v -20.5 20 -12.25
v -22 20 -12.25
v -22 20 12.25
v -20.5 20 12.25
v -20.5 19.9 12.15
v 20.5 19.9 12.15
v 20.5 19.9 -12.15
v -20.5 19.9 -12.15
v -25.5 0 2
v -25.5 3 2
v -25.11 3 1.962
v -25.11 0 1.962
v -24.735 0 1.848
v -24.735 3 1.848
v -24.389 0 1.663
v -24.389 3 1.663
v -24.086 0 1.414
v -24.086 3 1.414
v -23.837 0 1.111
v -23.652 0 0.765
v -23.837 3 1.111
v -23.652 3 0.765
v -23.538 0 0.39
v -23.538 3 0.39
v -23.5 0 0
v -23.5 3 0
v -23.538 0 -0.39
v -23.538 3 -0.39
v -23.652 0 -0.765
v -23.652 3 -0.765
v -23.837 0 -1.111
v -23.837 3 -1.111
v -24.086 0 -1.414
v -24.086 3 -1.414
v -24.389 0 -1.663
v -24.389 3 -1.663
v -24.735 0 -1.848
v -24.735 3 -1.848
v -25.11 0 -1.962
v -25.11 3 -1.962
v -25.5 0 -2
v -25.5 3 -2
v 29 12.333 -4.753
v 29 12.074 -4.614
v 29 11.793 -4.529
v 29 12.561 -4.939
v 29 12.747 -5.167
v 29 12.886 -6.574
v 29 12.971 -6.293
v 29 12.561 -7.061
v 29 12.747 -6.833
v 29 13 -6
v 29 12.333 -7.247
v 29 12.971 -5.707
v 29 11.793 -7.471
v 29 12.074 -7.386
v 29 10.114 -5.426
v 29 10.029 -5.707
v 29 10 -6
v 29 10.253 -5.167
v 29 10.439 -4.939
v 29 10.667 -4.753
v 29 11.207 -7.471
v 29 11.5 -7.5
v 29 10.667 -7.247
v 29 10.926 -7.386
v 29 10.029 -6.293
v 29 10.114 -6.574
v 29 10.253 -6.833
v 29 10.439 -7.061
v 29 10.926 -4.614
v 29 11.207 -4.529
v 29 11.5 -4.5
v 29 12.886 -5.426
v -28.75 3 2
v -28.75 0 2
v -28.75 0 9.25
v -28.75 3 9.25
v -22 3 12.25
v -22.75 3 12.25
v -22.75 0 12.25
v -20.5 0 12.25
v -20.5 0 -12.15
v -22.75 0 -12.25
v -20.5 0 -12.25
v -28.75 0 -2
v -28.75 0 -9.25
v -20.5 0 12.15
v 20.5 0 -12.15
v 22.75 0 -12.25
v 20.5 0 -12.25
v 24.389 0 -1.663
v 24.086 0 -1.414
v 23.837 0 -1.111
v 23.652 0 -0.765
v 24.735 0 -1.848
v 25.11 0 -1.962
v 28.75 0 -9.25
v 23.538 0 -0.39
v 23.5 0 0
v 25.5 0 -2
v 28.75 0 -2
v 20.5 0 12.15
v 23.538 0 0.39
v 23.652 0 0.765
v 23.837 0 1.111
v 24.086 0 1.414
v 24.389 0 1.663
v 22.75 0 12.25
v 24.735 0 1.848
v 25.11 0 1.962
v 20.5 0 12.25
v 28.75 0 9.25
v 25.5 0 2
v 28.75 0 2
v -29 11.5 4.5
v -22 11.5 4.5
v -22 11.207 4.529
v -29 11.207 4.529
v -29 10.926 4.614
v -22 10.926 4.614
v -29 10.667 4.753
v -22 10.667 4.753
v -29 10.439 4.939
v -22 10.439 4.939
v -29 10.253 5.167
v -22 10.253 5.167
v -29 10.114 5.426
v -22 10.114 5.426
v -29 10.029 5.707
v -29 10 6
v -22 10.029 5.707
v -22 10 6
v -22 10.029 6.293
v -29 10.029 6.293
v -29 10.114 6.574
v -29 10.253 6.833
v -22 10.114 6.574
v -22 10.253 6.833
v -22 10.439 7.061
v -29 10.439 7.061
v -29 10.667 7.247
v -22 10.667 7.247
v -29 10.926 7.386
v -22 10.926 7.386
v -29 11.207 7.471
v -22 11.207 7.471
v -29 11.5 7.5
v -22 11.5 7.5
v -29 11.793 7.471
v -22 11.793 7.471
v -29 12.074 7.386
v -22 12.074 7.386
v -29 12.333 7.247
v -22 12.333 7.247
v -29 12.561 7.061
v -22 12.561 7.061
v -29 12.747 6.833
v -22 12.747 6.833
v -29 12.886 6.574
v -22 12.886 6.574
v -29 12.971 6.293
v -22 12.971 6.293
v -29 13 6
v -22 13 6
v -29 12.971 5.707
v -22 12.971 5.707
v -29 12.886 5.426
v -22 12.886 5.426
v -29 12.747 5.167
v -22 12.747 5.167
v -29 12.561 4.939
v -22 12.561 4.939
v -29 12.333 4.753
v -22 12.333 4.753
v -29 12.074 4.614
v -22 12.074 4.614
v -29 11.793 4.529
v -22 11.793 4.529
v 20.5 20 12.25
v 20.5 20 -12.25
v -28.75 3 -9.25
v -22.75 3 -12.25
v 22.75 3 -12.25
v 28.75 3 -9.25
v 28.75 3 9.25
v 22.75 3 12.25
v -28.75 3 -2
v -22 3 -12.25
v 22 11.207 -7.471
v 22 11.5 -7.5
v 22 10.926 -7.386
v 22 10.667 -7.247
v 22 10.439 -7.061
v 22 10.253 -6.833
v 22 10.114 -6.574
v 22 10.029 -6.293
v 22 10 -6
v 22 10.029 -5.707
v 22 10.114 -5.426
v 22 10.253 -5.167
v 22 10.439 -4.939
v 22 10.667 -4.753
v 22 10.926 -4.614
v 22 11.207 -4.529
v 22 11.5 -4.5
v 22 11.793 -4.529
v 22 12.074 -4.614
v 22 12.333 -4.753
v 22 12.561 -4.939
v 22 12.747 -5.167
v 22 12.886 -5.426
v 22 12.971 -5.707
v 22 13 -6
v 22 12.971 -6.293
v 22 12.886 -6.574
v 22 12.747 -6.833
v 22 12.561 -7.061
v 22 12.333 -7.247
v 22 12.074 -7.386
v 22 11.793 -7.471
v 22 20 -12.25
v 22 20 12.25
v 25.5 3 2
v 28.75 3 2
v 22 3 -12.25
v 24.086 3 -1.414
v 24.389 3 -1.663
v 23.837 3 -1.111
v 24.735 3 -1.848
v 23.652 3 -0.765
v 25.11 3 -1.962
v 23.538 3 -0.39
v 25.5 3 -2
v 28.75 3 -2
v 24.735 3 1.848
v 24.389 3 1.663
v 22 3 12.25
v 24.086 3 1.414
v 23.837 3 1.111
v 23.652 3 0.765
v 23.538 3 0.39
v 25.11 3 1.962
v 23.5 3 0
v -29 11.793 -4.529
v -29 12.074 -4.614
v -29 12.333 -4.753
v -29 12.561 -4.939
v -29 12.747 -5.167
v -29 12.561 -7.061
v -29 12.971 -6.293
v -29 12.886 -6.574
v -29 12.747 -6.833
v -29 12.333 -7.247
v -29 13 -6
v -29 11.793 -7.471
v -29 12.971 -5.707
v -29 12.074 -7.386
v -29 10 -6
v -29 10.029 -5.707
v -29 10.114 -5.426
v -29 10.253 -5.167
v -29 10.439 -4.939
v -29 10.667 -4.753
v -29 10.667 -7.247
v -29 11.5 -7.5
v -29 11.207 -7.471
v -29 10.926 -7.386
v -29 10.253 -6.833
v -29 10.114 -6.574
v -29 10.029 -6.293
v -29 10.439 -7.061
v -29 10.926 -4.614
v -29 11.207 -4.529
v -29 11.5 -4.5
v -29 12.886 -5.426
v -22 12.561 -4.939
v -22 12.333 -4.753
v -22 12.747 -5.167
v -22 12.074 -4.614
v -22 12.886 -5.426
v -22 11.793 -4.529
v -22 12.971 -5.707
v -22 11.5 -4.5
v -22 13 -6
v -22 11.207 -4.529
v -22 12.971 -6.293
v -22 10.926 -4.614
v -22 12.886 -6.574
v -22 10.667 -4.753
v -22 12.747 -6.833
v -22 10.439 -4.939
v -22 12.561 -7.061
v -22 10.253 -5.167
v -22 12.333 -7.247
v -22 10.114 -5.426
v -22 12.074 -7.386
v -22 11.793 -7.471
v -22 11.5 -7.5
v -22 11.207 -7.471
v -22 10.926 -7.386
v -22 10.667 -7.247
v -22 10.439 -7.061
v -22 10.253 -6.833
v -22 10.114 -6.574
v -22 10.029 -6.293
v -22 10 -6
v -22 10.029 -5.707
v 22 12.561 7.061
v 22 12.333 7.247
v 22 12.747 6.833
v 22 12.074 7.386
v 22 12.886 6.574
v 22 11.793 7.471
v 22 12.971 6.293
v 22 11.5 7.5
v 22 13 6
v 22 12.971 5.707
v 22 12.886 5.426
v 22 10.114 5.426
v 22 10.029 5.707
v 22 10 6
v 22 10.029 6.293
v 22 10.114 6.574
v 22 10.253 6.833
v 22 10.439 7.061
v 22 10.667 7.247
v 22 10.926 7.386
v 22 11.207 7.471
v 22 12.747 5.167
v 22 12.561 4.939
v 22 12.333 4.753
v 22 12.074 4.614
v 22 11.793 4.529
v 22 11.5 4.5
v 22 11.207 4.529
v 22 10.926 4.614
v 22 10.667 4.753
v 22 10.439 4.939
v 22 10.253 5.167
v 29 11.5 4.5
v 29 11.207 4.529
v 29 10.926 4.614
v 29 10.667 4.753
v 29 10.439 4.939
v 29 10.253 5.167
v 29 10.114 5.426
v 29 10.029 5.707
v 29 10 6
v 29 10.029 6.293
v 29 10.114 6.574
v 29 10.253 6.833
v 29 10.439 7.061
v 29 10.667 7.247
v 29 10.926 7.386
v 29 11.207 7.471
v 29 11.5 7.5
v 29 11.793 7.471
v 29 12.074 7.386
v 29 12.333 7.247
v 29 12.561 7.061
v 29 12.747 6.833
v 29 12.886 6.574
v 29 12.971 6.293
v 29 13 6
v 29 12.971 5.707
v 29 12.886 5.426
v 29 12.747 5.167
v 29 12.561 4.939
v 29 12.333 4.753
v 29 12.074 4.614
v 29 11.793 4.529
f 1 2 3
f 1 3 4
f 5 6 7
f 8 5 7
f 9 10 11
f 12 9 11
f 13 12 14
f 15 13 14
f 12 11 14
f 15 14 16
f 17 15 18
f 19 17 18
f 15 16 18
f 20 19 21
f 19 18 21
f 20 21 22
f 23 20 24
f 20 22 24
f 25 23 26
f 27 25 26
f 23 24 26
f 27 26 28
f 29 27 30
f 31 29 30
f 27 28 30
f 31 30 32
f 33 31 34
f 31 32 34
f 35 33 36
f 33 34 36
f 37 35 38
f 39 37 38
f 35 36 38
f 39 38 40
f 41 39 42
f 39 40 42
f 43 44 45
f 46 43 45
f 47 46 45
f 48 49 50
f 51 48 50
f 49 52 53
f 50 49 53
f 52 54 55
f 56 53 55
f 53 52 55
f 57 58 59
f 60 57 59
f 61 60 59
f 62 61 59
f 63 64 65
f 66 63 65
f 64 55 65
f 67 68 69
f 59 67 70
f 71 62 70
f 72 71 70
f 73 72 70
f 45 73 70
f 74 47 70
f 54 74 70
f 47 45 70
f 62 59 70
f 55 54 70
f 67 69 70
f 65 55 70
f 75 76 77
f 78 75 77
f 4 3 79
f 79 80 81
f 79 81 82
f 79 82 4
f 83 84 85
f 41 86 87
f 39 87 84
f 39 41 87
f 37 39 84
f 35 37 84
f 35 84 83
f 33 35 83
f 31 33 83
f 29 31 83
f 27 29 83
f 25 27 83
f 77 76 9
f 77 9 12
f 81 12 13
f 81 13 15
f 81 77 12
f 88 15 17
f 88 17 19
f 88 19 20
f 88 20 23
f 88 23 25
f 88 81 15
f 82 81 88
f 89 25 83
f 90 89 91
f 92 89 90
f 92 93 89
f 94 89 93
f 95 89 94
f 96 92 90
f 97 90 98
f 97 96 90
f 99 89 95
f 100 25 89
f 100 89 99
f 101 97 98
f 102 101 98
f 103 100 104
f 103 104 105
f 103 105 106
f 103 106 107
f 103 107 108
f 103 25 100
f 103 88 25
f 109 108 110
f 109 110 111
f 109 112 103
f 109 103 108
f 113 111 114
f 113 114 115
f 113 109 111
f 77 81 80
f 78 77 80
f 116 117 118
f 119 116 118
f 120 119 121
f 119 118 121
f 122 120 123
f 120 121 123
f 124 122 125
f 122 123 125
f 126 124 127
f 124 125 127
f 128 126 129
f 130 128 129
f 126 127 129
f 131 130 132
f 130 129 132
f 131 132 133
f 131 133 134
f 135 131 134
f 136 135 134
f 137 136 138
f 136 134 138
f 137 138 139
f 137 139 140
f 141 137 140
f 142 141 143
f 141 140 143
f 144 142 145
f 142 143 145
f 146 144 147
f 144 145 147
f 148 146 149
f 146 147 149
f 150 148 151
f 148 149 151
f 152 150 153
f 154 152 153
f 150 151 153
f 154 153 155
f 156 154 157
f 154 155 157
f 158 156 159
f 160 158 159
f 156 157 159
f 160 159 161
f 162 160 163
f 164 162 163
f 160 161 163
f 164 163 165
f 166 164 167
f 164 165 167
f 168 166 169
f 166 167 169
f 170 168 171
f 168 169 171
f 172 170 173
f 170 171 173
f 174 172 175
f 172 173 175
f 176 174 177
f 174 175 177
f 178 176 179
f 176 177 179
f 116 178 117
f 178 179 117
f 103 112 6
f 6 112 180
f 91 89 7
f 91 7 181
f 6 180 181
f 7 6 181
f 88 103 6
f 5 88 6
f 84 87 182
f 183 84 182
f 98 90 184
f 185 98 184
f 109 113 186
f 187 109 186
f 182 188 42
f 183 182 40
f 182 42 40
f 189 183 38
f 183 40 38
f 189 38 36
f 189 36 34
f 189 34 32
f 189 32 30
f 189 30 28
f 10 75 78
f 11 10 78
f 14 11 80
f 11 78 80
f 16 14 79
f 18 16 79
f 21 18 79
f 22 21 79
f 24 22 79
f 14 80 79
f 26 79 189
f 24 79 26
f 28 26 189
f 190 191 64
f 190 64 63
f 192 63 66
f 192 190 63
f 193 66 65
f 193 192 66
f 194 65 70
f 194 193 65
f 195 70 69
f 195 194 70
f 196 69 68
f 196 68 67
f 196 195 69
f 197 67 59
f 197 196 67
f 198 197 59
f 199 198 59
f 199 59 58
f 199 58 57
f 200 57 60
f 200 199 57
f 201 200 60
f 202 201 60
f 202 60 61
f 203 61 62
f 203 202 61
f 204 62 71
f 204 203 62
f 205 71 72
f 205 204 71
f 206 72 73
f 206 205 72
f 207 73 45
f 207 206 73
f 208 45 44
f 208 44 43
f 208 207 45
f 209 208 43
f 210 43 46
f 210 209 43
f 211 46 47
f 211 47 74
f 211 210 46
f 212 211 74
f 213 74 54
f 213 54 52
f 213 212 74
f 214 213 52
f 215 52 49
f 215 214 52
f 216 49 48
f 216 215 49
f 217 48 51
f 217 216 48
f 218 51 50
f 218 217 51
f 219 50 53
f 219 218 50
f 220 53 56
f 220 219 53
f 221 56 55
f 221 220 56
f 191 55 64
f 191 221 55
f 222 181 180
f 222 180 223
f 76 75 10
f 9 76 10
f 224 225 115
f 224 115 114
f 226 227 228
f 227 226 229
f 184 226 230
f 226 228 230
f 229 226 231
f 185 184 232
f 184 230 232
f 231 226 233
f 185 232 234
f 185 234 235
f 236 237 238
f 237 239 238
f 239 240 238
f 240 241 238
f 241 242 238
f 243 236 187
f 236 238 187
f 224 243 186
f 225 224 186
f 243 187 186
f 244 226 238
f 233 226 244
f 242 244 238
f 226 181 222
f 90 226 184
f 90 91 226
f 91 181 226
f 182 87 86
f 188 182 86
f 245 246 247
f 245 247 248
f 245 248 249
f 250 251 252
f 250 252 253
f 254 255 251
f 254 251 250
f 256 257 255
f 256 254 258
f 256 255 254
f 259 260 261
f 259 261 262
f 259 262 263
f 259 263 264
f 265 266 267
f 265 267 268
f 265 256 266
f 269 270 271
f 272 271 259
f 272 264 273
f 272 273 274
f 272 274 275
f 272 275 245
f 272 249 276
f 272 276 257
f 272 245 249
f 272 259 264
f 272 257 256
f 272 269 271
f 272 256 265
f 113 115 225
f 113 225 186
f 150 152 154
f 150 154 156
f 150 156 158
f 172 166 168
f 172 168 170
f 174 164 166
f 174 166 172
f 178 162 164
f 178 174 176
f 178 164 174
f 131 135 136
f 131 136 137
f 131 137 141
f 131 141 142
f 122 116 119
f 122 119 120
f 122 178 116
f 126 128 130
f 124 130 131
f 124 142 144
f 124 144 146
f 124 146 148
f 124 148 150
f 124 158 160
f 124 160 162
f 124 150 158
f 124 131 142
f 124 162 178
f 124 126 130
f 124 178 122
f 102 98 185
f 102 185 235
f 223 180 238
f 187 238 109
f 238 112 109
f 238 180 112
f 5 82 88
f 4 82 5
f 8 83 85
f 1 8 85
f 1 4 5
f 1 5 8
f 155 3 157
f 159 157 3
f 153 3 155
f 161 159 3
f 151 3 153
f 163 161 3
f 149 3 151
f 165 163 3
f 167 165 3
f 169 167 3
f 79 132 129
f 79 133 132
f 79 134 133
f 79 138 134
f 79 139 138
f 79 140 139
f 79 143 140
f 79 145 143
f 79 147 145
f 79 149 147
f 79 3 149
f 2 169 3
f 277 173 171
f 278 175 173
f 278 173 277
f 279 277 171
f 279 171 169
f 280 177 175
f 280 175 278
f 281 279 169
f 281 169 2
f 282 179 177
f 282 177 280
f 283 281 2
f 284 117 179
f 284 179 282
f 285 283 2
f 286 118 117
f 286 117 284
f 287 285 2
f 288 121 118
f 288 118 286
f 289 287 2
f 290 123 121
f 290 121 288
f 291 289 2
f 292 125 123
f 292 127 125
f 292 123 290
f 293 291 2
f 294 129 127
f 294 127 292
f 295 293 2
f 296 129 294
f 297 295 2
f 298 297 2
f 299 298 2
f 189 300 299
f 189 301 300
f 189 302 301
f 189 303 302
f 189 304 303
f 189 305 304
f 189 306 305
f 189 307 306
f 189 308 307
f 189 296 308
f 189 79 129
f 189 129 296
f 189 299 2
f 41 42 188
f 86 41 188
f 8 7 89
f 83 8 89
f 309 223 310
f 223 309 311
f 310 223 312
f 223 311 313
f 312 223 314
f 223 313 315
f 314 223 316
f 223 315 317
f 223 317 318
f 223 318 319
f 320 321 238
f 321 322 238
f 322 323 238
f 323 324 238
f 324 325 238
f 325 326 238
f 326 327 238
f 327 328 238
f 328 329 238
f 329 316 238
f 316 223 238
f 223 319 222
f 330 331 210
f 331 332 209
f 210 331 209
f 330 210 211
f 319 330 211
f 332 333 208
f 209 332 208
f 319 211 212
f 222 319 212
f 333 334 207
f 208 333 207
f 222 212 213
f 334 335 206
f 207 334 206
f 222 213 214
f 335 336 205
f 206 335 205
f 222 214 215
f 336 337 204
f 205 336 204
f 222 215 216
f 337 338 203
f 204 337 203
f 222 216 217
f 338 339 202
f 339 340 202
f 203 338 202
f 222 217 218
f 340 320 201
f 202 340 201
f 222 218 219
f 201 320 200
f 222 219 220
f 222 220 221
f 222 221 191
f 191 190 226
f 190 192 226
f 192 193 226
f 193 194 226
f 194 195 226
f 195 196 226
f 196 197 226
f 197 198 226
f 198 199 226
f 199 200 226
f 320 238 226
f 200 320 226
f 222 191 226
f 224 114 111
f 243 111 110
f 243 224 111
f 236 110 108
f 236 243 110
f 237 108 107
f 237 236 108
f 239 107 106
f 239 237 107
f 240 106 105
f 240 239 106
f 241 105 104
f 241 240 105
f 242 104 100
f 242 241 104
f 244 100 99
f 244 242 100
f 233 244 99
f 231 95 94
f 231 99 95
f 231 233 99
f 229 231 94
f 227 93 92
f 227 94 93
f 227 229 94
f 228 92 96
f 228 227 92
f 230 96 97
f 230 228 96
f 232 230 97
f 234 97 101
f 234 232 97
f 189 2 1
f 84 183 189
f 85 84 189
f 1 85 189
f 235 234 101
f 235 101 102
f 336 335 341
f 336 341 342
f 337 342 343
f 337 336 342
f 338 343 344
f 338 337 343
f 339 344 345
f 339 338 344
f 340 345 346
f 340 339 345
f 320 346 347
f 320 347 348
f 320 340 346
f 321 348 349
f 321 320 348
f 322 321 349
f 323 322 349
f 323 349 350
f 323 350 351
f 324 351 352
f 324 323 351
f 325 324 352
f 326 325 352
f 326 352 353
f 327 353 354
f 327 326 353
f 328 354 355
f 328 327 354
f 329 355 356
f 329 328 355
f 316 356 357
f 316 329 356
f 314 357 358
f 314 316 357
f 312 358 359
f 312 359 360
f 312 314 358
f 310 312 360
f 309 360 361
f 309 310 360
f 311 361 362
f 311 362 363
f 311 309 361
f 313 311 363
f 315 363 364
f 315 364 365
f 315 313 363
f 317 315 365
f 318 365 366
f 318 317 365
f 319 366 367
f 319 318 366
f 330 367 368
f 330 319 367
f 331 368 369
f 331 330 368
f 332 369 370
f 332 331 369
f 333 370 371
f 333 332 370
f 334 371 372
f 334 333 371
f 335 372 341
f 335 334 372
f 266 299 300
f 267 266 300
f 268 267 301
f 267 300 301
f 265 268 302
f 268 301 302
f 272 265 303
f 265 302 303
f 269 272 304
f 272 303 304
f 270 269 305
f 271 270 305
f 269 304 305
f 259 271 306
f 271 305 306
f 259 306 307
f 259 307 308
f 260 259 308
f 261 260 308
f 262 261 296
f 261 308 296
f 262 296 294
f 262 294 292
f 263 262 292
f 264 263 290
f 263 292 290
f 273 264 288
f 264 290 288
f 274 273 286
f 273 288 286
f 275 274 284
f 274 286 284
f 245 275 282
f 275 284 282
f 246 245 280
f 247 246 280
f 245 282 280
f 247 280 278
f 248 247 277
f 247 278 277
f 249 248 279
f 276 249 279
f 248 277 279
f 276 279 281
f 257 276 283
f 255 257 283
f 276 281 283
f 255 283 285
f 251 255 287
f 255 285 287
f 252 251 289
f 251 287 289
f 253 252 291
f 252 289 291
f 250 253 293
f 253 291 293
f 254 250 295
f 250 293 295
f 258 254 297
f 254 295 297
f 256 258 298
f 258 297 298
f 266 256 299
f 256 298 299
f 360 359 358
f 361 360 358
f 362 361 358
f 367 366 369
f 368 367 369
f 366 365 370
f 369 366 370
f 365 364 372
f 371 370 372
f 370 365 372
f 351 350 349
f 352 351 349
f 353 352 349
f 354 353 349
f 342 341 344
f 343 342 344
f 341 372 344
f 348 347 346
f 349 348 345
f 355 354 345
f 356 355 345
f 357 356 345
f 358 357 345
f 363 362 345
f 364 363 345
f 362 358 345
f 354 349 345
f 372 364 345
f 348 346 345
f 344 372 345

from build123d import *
from OCP.BRepFilletAPI import BRepFilletAPI_MakeChamfer

# Parameters (mm, degrees)
SKETCH_1_W          = 44
SKETCH_1_H          = 24.5
EXTRUDE_1_DEPTH     = 20
SKETCH_2_W          = 57.5
SKETCH_2_H          = 24.5
EXTRUDE_2_DEPTH     = 3
CHAMFER_1_SIZE      = 3
CHAMFER_1_SIZE2     = 6
CHAMFER_2_SIZE      = 6
CHAMFER_2_SIZE2     = 3
CUT_EXTRUDE_1_DEPTH = 36.575623677
SKETCH_4_R          = 1.5
EXTRUDE_3_DEPTH     = 7
CUT_EXTRUDE_2_DEPTH = 20.5


with BuildPart() as part:
    # 草图1 → 凸台-拉伸1 (new body)
    with BuildSketch(Plane(origin=(0, 0, 0), x_dir=(1, 0, 0), z_dir=(0, 1, 0))):
        Rectangle(SKETCH_1_W, SKETCH_1_H)
    extrude(amount=EXTRUDE_1_DEPTH)

    # 草图2 → 凸台-拉伸2 (add)
    with BuildSketch(Plane.XZ):
        Rectangle(SKETCH_2_W, SKETCH_2_H)
    extrude(amount=-EXTRUDE_2_DEPTH)

    # 倒角1: one chamfer whose edges measure the first distance from different faces: ONE call of the kernel's chamfer builder (chamfer() names one face for all edges)
    chamfer_1_edges_1 = [part.edges().sort_by_distance(p)[0] for p in [
        (-28.75, 1.5, 12.25),
    ]]
    chamfer_1_side_1 = [part.faces().sort_by_distance(p)[0] for p in [
        (-28.75, 1.5, 0),
    ]]
    chamfer_1_edges_2 = [part.edges().sort_by_distance(p)[0] for p in [
        (28.75, 1.5, -12.25),
    ]]
    chamfer_1_side_2 = [part.faces().sort_by_distance(p)[0] for p in [
        (28.75, 1.5, 0),
    ]]
    chamfer_1 = BRepFilletAPI_MakeChamfer(part.part.solid().wrapped)
    for e in chamfer_1_edges_1:
        chamfer_1.Add(CHAMFER_1_SIZE, CHAMFER_1_SIZE2, e.wrapped, chamfer_1_side_1[0].wrapped)  # the first distance lies on this face
    for e in chamfer_1_edges_2:
        chamfer_1.Add(CHAMFER_1_SIZE, CHAMFER_1_SIZE2, e.wrapped, chamfer_1_side_2[0].wrapped)  # the first distance lies on this face
    add(Compound.cast(chamfer_1.Shape()), mode=Mode.REPLACE)

    # 倒角2: one chamfer whose edges measure the first distance from different faces: ONE call of the kernel's chamfer builder (chamfer() names one face for all edges)
    chamfer_2_edges_1 = [part.edges().sort_by_distance(p)[0] for p in [
        (-28.75, 1.5, -12.25),
    ]]
    chamfer_2_side_1 = [part.faces().sort_by_distance(p)[0] for p in [
        (-0.513573407, 9.788088643, -12.25),
    ]]
    chamfer_2_edges_2 = [part.edges().sort_by_distance(p)[0] for p in [
        (28.75, 1.5, 12.25),
    ]]
    chamfer_2_side_2 = [part.faces().sort_by_distance(p)[0] for p in [
        (0.513573407, 9.788088643, 12.25),
    ]]
    chamfer_2 = BRepFilletAPI_MakeChamfer(part.part.solid().wrapped)
    for e in chamfer_2_edges_1:
        chamfer_2.Add(CHAMFER_2_SIZE, CHAMFER_2_SIZE2, e.wrapped, chamfer_2_side_1[0].wrapped)  # the first distance lies on this face
    for e in chamfer_2_edges_2:
        chamfer_2.Add(CHAMFER_2_SIZE, CHAMFER_2_SIZE2, e.wrapped, chamfer_2_side_2[0].wrapped)  # the first distance lies on this face
    add(Compound.cast(chamfer_2.Shape()), mode=Mode.REPLACE)

    # 草图3 → 切除-拉伸1 (cut, through all)
    with BuildSketch(Plane(origin=(0, 3, 0), x_dir=(1, 0, 0), z_dir=(0, 1, 0))):
        with BuildLine():
            Line((-25.5, 2), (-28.75, 2))
            Line((-28.75, 2), (-28.75, -2))
            Line((-28.75, -2), (-25.5, -2))
            ThreePointArc((-25.5, -2), (-23.5, 0), (-25.5, 2))
        make_face()
        with BuildLine():
            Line((28.75, -2), (25.5, -2))
            ThreePointArc((25.5, -2), (23.5, 0), (25.5, 2))
            Line((25.5, 2), (28.75, 2))
            Line((28.75, 2), (28.75, -2))
        make_face()
    extrude(amount=-CUT_EXTRUDE_1_DEPTH, mode=Mode.SUBTRACT)

    # 草图4 → 凸台-拉伸3 (add)
    with BuildSketch(Plane.ZY.offset(22)):
        with Locations(Location((-6, 11.5, 0), (0, 0, 180))):
            Circle(SKETCH_4_R)
        with Locations(Location((6, 11.5, 0), (0, 0, 180))):
            Circle(SKETCH_4_R)
    extrude_3 = extrude(amount=EXTRUDE_3_DEPTH)

    # 镜向1: 凸台-拉伸3 across plane
    add(extrude_3.mirror(Plane.ZY))

    # 草图5 → 切除-拉伸2 (cut, symmetric)
    with BuildSketch(Plane(origin=(0, 0, 0), x_dir=(0, 0, -1), z_dir=(1, 0, 0))):
        Polygon((-12.25, 3), (-12.25, 0), (-12.15, 0), (-12.15, 3.1), (-12.15, 19.9), (12.15, 19.9), (12.15, 3.1), (12.15, 0), (12.25, 0), (12.25, 3), (12.25, 20), (-12.25, 20), align=None)
    extrude(amount=CUT_EXTRUDE_2_DEPTH, both=True, mode=Mode.SUBTRACT)


solid = part.part
